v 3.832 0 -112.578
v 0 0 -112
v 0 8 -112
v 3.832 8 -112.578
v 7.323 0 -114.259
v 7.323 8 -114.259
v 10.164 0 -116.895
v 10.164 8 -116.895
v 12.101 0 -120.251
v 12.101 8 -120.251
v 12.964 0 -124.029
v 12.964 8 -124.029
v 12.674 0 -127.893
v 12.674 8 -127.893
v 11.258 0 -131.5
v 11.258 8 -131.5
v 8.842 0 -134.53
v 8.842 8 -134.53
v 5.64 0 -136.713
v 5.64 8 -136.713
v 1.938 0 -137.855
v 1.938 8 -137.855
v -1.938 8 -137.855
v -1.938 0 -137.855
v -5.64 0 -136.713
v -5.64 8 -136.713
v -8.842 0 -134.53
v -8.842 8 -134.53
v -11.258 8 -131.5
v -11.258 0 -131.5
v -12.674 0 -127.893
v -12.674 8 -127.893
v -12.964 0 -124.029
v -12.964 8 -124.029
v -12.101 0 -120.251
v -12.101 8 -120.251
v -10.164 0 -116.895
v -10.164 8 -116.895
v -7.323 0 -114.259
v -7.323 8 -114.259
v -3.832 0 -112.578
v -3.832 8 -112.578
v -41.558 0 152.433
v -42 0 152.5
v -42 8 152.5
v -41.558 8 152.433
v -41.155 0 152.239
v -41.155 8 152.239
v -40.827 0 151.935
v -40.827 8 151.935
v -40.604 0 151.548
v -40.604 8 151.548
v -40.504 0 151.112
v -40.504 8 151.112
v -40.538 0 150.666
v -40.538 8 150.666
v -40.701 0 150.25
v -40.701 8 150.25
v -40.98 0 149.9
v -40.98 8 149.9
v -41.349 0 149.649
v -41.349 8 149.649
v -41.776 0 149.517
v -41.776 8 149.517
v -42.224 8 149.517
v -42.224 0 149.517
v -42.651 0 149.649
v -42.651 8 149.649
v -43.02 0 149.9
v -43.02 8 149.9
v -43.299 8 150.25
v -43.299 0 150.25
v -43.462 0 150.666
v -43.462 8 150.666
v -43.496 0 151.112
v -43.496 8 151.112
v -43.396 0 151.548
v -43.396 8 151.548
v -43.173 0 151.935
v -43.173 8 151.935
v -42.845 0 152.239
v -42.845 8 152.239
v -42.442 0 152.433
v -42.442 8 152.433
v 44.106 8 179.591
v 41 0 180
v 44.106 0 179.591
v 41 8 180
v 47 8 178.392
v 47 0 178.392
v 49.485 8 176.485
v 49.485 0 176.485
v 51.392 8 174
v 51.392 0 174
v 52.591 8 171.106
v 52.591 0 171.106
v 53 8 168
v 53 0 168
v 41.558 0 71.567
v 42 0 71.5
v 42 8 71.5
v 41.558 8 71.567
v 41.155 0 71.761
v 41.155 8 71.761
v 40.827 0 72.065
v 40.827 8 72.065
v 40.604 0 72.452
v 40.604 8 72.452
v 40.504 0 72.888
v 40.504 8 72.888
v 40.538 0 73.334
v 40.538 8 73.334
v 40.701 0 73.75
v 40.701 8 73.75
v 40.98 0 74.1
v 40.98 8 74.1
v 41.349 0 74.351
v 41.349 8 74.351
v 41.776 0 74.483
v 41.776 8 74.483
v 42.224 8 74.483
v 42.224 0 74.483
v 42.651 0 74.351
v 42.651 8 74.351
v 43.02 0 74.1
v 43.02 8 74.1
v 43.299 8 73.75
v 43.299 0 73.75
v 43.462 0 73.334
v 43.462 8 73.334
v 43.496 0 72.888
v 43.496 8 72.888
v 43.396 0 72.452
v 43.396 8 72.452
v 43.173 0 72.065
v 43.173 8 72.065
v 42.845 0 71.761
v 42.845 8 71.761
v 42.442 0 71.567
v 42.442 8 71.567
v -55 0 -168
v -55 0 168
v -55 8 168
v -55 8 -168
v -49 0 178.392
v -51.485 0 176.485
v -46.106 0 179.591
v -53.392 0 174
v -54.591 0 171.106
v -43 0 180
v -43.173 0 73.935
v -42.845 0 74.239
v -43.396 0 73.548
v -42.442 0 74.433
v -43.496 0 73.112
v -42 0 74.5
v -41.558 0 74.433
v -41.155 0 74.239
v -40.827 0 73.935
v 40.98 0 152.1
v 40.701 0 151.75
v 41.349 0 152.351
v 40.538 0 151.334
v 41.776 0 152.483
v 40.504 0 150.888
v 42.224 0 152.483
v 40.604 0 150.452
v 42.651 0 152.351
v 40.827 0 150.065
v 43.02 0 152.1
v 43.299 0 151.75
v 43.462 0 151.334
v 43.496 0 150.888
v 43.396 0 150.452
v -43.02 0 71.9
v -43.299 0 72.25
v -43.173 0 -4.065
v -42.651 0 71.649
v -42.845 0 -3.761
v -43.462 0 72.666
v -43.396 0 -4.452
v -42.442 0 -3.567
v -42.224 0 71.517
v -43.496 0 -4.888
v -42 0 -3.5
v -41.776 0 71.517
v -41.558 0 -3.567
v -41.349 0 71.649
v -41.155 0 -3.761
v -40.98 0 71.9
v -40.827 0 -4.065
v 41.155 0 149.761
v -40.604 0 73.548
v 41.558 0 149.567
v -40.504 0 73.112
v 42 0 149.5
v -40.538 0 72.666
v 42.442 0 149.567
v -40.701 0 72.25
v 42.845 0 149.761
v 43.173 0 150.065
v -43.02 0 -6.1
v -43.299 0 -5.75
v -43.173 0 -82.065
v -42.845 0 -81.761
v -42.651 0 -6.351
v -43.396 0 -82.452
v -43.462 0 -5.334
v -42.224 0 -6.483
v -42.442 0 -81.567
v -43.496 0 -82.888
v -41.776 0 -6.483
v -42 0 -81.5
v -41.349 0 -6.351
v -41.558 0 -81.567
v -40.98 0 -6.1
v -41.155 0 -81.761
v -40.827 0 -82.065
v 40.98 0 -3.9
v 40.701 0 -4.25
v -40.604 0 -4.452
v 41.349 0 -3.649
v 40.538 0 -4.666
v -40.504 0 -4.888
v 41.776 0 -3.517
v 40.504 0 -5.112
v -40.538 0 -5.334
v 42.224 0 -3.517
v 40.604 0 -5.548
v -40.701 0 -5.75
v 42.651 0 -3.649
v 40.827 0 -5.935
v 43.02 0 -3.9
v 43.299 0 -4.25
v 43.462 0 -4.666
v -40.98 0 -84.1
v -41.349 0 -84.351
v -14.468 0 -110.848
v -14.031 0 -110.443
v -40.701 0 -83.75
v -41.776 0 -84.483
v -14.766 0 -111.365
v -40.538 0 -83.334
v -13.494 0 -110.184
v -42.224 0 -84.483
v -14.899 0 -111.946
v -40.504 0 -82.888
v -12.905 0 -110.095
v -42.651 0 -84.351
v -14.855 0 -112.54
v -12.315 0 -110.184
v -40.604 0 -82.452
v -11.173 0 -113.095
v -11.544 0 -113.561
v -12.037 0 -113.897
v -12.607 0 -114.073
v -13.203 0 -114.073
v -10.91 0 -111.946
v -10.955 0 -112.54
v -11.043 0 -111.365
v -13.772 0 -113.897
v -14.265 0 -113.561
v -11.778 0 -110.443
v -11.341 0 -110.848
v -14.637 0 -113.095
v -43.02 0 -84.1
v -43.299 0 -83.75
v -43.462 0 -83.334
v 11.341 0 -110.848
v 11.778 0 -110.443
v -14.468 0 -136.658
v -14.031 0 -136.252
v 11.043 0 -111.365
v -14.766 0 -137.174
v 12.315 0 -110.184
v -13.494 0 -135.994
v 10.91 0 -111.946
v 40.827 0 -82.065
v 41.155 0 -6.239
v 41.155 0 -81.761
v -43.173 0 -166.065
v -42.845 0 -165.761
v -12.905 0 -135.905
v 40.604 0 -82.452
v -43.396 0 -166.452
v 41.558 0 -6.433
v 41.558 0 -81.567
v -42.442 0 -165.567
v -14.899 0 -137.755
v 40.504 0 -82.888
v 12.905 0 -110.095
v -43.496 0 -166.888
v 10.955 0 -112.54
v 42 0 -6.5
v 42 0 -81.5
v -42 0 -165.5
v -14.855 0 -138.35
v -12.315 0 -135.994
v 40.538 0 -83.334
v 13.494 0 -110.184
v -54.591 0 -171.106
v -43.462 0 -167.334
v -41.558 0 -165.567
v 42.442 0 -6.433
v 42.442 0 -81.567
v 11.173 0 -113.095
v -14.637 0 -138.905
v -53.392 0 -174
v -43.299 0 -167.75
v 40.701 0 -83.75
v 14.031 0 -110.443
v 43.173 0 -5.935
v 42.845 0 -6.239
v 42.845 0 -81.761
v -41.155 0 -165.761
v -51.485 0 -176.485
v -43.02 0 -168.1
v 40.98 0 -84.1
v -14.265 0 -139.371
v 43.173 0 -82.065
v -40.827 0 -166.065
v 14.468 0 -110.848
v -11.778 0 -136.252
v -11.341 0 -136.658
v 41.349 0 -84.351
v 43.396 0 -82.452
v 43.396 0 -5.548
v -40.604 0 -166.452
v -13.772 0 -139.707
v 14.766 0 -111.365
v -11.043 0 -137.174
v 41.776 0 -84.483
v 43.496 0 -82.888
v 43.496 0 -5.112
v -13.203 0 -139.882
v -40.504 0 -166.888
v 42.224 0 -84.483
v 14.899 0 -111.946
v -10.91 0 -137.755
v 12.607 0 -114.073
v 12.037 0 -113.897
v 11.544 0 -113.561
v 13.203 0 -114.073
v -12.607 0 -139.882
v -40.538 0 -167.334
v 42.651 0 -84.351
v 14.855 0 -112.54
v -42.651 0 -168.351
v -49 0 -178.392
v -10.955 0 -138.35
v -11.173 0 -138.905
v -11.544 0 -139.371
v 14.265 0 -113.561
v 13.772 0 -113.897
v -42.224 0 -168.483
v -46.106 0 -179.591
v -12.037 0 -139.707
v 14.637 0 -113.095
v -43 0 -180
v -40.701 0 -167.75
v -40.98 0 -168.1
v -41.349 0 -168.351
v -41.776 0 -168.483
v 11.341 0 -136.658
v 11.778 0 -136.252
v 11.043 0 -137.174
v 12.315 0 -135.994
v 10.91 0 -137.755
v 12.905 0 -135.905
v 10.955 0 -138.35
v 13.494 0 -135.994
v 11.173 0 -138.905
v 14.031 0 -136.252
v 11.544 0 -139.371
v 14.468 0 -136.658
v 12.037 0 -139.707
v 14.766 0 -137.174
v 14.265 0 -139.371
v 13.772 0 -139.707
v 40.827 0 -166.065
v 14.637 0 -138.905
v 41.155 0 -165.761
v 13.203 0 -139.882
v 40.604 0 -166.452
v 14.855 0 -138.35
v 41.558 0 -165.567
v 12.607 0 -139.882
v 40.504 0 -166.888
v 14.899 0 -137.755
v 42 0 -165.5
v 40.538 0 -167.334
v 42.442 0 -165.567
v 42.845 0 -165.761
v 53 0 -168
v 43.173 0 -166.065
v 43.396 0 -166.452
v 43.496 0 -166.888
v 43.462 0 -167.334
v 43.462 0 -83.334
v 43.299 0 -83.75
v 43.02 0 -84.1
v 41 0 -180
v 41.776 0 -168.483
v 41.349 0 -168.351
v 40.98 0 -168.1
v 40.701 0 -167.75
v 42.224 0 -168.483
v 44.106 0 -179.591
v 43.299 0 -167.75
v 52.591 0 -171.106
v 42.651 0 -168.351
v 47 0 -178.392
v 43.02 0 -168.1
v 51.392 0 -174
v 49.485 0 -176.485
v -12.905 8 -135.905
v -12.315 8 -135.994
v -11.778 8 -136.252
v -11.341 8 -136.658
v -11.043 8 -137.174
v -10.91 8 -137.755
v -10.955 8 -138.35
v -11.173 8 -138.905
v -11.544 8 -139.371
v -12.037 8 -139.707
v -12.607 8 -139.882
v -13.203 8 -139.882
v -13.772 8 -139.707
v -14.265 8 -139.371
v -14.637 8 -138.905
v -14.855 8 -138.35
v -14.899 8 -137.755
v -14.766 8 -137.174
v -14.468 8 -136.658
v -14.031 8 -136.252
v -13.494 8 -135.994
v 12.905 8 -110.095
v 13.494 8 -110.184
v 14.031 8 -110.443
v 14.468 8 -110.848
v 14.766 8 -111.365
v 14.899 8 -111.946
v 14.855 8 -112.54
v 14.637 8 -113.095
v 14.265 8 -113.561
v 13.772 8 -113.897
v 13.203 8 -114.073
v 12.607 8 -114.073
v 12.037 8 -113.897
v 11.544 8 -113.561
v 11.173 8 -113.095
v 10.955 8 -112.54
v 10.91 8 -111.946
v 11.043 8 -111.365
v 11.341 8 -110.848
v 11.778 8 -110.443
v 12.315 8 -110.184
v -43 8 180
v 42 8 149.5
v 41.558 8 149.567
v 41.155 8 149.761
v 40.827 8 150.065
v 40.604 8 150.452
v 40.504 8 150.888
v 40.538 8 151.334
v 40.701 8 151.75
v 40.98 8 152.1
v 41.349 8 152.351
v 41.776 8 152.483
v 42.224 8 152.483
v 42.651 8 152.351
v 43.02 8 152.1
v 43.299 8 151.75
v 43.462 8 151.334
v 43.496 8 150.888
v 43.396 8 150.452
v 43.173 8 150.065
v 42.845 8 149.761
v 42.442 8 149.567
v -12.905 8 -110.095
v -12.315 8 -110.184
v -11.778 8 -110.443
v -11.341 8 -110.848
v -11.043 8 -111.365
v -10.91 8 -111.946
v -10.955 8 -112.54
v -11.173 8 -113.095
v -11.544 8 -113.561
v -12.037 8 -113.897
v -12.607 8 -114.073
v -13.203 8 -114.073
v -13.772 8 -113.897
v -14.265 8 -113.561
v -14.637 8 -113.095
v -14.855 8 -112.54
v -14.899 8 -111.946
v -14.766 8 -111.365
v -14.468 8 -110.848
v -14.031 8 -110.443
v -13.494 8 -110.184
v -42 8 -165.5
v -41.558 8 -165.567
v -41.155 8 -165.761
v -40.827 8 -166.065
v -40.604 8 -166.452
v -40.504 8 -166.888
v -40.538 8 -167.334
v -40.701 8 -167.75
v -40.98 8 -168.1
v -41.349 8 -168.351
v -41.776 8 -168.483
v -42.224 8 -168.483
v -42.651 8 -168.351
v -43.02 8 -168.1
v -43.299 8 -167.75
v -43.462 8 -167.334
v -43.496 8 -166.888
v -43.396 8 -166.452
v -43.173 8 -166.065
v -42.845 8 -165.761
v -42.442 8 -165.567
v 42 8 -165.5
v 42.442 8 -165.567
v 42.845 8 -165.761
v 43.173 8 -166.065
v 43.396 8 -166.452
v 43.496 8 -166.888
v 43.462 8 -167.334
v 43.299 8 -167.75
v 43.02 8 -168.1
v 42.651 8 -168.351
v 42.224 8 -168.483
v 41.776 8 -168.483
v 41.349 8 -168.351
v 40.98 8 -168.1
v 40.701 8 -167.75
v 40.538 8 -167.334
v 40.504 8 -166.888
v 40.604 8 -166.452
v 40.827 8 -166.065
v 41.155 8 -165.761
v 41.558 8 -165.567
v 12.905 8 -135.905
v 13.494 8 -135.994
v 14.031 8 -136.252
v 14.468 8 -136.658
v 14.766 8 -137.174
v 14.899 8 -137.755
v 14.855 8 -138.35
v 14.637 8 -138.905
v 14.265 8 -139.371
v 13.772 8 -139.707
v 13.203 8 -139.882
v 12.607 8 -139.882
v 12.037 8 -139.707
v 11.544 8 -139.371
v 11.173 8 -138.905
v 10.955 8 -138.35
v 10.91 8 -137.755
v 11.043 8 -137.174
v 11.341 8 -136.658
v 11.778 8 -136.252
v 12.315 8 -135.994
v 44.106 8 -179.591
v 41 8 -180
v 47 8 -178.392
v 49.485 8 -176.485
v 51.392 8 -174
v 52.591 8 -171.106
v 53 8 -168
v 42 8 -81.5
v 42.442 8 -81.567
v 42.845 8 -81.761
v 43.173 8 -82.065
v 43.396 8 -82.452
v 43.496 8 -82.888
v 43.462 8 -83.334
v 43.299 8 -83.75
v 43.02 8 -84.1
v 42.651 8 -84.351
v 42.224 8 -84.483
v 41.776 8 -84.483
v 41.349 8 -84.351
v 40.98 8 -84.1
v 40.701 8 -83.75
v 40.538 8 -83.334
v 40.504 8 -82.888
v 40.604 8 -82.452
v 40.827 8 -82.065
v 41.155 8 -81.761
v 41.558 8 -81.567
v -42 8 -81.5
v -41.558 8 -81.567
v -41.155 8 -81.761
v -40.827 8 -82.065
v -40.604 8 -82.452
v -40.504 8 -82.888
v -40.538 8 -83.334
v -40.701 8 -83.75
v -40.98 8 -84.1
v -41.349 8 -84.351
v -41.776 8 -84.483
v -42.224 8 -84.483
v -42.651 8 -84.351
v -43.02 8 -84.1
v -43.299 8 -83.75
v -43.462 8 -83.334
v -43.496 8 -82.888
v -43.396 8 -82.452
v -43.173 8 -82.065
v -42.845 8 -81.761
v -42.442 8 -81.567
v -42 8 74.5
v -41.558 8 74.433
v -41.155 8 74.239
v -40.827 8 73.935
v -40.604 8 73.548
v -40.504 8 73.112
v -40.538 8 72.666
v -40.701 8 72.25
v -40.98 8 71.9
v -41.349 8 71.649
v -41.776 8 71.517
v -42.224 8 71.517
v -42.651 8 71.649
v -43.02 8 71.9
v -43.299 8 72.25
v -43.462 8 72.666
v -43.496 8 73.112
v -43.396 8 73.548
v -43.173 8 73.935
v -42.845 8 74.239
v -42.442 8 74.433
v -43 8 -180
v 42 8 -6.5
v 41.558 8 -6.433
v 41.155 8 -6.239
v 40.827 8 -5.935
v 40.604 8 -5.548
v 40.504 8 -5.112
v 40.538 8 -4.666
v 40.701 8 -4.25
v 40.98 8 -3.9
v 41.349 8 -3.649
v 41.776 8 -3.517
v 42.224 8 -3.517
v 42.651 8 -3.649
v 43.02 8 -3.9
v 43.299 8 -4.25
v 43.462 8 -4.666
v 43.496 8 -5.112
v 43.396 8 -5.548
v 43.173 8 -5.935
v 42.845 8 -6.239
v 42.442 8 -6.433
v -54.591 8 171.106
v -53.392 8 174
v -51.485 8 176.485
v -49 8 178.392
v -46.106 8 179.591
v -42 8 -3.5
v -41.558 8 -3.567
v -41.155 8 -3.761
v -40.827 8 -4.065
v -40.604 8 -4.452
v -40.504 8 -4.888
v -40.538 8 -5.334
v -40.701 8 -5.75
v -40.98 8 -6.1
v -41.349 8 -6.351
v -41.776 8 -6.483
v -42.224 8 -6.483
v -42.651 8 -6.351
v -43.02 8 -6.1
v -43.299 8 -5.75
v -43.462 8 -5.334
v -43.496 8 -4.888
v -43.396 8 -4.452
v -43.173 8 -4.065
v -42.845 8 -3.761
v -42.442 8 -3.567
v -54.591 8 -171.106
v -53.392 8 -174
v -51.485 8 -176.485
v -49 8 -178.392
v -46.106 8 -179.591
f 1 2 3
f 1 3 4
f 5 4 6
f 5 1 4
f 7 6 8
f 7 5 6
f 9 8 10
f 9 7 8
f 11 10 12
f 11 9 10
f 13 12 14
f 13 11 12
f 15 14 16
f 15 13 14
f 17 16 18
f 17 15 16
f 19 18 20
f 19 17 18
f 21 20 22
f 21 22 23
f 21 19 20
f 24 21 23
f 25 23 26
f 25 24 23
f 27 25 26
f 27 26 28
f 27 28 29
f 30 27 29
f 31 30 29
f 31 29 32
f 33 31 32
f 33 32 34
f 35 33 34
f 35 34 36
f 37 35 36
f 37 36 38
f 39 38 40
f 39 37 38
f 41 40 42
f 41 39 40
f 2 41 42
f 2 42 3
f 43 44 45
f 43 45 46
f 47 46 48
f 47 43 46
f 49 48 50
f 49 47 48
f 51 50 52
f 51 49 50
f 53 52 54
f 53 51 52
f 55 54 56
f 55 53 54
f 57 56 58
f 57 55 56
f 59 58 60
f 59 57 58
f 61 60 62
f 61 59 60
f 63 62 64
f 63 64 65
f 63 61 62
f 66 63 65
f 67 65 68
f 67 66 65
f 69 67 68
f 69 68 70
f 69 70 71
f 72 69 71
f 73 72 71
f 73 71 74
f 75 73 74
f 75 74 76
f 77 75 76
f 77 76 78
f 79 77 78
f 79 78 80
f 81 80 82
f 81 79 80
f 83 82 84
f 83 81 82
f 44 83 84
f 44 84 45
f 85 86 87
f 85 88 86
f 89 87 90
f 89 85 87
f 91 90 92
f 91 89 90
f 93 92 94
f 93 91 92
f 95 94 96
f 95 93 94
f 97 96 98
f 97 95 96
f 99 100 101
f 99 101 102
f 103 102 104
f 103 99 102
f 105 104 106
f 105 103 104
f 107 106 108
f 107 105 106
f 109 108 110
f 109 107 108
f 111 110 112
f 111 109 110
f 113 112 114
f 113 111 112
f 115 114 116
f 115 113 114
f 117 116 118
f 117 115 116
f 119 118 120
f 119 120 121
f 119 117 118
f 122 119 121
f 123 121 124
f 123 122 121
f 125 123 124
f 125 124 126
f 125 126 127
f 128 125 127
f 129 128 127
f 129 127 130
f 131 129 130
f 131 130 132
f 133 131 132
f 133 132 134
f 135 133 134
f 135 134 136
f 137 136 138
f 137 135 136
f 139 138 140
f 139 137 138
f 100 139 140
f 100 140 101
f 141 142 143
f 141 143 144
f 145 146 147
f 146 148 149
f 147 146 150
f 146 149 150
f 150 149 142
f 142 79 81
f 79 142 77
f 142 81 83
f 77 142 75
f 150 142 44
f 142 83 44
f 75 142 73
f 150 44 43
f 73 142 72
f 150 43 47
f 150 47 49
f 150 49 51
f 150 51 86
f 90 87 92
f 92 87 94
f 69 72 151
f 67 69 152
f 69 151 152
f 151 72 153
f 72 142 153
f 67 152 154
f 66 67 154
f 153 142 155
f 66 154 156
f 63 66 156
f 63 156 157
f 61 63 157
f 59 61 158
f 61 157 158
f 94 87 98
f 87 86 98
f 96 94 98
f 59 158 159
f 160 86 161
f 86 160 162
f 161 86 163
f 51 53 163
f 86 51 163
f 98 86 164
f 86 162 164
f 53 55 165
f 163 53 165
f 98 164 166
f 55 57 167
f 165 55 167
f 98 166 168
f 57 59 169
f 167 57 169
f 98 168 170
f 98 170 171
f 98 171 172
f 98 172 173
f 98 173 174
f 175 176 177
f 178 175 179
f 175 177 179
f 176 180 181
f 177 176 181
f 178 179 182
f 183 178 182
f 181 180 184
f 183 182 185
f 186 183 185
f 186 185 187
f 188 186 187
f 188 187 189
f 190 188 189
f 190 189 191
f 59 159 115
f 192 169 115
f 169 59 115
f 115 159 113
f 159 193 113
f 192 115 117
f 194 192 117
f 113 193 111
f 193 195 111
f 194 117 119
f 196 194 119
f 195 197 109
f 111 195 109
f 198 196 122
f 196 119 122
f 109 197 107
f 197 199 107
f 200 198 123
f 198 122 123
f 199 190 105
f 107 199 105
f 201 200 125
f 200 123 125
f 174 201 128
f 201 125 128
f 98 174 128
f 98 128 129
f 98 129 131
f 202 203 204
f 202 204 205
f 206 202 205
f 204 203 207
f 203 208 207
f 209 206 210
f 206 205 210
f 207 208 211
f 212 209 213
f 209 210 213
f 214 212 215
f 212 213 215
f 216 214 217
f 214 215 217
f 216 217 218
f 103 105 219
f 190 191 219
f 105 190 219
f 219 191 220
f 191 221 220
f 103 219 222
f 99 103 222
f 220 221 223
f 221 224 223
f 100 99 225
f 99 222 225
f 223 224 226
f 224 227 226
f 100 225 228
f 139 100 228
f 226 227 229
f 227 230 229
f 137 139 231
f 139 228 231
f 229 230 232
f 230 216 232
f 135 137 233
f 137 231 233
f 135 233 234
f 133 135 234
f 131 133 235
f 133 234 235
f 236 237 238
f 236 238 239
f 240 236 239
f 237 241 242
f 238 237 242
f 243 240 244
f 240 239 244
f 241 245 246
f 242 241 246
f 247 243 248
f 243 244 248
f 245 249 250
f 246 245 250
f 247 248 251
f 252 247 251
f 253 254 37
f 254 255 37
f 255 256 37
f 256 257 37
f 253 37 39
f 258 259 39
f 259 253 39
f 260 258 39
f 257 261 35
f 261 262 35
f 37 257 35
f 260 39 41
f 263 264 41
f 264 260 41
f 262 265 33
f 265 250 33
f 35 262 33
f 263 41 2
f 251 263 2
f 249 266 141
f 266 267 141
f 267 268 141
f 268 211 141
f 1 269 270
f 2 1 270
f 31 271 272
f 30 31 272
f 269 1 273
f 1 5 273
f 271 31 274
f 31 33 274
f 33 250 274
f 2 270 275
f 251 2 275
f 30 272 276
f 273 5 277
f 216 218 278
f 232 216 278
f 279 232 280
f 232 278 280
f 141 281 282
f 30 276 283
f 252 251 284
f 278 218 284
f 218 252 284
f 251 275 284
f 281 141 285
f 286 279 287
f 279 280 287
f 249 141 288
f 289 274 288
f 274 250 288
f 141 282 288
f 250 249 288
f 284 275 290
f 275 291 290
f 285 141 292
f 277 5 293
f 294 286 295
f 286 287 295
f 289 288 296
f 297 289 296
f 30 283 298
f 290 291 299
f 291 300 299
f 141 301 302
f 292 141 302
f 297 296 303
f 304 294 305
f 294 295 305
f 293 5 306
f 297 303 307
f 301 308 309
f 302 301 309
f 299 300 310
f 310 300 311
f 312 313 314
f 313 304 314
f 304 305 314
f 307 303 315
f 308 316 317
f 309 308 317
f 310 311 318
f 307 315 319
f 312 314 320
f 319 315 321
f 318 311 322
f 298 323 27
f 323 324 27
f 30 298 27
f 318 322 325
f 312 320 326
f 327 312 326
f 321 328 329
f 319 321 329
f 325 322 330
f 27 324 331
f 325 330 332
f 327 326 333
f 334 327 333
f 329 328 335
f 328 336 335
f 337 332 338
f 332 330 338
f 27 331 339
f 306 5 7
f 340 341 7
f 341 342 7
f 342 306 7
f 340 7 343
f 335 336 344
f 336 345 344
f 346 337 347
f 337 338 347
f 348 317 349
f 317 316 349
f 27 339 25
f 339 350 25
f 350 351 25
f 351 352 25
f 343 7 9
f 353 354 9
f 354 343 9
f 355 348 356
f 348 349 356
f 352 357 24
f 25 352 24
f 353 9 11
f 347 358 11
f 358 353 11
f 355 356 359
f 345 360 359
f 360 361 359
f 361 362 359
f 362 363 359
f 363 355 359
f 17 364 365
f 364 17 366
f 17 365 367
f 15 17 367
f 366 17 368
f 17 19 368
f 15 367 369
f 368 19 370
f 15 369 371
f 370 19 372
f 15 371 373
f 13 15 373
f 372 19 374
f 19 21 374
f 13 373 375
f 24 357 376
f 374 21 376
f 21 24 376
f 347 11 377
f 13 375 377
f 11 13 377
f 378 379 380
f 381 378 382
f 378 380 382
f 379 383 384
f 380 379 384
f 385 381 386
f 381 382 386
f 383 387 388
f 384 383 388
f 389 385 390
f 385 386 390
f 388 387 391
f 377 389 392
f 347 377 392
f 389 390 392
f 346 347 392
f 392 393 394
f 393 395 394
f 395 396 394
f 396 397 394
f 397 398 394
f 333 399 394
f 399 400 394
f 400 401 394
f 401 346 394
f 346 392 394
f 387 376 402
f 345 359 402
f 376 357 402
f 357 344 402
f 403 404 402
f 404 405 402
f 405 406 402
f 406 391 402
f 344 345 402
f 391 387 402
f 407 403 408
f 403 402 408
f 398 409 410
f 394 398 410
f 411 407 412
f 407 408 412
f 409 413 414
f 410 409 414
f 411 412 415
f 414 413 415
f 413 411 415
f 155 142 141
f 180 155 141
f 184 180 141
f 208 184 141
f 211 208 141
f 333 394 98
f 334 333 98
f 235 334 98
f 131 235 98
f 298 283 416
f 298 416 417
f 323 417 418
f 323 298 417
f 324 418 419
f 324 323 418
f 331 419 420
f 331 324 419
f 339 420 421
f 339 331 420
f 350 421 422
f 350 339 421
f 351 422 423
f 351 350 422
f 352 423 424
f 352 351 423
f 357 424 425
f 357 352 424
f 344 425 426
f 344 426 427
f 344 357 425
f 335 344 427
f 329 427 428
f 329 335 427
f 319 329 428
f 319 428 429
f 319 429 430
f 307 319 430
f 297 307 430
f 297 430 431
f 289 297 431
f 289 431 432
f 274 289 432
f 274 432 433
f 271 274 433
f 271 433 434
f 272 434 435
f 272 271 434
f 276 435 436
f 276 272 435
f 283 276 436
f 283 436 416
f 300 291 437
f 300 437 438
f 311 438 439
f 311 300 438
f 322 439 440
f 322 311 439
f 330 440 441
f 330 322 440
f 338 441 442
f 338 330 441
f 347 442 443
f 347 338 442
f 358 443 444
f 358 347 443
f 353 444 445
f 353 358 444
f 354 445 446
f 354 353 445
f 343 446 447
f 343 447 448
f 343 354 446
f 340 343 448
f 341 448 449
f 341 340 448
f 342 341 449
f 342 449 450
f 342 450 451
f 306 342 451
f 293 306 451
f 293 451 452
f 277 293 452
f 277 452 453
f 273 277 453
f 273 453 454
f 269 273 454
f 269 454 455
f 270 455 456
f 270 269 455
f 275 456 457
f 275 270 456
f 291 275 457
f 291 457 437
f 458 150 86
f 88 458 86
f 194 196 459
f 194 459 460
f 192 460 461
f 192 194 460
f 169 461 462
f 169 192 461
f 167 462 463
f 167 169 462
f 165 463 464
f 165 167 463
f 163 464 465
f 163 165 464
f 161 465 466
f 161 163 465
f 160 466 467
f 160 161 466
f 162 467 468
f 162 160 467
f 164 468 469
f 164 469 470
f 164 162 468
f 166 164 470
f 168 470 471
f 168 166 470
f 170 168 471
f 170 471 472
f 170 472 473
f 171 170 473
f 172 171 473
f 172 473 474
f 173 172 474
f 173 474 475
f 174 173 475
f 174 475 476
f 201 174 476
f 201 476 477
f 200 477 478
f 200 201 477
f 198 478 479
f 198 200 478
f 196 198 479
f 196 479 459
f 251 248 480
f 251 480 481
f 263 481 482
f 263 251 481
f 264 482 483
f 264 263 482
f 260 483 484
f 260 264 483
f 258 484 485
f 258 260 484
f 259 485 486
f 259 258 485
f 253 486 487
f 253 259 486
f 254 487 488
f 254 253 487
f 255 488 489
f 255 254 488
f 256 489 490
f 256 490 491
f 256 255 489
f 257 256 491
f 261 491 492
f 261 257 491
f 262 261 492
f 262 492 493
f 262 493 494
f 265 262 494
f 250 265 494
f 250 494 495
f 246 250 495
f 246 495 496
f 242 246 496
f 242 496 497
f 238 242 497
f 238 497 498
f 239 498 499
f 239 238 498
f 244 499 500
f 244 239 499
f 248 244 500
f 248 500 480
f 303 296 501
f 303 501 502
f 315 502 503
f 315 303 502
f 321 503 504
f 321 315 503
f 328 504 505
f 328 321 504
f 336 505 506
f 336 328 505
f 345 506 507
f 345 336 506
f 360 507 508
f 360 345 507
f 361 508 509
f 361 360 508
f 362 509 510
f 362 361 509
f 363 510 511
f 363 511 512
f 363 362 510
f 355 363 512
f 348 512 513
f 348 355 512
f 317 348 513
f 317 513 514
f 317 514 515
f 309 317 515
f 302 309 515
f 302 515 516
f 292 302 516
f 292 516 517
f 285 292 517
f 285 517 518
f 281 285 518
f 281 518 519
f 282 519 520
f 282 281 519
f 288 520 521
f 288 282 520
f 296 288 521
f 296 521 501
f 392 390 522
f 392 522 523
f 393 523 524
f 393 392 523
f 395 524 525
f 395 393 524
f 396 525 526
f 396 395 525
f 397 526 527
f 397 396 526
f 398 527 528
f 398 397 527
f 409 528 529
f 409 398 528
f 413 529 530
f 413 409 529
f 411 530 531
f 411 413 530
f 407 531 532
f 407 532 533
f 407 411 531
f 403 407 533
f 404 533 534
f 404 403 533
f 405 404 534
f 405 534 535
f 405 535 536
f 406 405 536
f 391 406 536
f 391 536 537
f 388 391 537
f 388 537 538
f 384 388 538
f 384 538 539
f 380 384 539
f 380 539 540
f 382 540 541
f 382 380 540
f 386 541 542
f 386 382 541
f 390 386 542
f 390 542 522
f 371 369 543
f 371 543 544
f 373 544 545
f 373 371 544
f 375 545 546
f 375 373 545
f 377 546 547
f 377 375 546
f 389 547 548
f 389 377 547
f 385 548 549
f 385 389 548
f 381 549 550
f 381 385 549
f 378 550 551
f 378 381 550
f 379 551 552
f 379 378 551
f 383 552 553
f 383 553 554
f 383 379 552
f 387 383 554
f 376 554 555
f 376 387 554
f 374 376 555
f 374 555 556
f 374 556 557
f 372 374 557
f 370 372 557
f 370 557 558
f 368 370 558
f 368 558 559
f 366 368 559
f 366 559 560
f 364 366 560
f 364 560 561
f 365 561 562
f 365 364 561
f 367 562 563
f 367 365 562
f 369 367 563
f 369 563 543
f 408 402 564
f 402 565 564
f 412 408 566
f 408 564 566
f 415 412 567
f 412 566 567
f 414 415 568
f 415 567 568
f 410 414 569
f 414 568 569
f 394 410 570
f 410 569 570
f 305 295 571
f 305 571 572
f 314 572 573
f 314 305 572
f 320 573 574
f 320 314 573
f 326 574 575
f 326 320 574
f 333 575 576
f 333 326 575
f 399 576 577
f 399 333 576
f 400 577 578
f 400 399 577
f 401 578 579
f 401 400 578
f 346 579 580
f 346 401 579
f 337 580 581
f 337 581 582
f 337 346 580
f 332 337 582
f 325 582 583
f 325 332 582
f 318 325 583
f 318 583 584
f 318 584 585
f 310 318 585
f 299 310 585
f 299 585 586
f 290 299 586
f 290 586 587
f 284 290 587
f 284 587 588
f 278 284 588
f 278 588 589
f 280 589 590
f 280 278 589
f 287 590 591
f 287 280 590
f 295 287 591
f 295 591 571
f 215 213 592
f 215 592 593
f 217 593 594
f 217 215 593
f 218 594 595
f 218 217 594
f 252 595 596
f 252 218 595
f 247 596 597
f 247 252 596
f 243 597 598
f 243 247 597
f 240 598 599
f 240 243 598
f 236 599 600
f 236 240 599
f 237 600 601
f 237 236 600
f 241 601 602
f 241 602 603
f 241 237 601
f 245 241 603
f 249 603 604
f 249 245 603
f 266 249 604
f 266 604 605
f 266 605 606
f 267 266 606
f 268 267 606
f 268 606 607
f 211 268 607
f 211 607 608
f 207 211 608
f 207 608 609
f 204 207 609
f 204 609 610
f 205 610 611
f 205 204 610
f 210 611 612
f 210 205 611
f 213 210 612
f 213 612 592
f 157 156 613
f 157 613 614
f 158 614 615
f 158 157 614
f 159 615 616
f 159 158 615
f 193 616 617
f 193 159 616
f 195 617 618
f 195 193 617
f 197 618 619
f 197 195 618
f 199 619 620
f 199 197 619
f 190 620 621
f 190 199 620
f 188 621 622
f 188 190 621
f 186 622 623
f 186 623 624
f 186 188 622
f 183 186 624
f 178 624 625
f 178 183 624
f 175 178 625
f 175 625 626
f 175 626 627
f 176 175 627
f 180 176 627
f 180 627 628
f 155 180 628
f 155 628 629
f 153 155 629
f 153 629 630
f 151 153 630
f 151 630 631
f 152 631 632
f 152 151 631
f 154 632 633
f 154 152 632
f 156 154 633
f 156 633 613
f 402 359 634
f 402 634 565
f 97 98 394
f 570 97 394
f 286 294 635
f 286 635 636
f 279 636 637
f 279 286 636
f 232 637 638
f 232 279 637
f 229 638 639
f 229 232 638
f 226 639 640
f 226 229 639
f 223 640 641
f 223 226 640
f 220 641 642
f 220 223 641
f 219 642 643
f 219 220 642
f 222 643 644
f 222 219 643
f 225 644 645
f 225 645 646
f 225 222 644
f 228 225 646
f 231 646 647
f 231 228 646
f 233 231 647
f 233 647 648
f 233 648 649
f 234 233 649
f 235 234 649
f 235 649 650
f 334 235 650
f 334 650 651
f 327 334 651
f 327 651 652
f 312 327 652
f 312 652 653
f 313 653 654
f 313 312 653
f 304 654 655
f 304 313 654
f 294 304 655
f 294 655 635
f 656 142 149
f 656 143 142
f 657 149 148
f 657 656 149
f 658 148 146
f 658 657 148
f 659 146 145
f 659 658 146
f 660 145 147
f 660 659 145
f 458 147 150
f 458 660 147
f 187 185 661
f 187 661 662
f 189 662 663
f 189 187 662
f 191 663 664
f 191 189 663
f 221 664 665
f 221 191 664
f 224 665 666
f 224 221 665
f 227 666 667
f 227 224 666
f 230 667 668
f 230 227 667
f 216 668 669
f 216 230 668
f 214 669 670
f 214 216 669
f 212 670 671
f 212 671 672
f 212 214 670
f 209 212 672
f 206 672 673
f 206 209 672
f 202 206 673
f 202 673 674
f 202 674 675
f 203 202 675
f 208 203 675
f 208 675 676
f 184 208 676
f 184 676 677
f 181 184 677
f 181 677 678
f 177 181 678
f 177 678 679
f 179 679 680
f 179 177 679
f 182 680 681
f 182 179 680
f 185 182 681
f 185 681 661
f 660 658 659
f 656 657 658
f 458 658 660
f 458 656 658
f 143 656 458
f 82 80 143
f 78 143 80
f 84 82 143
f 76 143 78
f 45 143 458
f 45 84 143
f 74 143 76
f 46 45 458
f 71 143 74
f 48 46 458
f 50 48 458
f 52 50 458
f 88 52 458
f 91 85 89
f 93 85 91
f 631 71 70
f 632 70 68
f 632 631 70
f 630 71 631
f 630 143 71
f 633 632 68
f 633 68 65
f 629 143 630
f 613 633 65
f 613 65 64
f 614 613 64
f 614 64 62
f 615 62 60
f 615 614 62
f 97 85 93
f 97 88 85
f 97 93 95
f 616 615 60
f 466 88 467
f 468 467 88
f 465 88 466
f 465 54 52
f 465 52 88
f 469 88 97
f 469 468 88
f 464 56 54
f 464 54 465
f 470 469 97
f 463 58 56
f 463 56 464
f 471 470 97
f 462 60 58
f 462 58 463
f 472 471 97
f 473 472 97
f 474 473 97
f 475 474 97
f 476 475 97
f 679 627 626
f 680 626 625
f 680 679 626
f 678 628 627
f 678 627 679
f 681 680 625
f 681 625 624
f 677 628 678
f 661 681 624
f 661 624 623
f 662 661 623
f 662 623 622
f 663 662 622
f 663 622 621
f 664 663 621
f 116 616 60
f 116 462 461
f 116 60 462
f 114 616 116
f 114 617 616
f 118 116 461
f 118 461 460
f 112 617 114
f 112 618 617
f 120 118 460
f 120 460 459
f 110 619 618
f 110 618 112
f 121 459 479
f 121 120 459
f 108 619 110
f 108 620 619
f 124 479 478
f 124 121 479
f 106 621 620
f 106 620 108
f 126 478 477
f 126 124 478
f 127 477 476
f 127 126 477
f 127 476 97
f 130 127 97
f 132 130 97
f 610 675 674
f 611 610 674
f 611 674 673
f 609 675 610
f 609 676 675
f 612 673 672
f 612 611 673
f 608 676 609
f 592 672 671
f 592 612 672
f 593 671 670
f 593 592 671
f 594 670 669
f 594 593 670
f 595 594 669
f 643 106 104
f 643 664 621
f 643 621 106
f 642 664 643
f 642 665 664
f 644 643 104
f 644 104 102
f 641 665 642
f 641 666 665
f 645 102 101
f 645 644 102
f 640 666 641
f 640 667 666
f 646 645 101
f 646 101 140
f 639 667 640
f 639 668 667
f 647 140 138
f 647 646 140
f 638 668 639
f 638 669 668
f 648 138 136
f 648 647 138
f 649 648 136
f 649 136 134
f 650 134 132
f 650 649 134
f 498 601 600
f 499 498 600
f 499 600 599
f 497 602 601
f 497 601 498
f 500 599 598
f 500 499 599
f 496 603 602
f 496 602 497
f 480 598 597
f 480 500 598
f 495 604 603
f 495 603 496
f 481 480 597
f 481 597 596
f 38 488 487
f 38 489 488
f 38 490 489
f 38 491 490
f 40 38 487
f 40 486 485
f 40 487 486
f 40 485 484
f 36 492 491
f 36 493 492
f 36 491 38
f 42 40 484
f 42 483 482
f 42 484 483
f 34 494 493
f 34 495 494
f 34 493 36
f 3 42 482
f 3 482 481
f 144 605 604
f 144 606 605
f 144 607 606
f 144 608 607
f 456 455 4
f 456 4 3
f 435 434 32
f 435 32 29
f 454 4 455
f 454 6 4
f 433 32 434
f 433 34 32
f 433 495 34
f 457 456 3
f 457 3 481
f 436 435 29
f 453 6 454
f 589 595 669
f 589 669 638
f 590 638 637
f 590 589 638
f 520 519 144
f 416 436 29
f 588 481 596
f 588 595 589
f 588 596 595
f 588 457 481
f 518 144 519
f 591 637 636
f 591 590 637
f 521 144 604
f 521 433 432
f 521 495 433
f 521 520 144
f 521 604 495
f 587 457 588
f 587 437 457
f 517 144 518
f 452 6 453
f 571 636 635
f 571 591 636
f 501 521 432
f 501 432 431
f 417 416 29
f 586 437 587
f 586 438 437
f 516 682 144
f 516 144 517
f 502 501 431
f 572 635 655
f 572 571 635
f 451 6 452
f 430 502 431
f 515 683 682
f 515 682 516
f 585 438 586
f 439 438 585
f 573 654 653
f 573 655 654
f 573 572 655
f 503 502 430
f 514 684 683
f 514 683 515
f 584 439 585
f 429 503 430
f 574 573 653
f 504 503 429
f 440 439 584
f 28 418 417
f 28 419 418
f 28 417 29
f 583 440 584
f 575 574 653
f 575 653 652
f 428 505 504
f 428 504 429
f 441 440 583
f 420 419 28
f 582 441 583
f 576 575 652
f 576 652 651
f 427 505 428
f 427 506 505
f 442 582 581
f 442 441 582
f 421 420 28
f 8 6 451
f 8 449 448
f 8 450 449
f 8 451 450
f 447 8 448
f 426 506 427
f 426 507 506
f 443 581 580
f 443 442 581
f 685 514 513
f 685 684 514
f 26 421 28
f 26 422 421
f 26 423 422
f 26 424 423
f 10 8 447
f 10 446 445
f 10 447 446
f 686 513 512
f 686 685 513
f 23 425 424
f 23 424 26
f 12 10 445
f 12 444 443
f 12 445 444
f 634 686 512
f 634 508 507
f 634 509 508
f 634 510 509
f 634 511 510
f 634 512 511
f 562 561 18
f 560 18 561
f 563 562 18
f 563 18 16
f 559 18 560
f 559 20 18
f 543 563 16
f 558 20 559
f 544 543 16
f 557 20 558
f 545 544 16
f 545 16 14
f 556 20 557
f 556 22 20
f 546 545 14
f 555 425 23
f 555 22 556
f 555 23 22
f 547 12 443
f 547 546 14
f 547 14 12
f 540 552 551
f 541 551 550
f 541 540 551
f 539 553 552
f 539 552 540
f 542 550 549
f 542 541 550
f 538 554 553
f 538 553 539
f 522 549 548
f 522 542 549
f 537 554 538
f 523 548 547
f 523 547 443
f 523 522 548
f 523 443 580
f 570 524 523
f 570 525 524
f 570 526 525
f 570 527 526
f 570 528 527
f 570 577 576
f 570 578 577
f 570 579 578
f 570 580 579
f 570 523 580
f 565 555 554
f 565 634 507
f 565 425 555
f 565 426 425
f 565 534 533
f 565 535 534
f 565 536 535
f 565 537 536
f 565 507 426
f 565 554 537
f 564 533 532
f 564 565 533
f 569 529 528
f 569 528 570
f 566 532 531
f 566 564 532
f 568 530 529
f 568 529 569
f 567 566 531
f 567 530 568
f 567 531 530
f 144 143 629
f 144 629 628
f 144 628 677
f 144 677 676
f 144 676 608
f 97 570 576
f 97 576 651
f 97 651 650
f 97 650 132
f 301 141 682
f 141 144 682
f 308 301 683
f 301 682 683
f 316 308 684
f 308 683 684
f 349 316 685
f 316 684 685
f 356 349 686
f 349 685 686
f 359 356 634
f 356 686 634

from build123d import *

# Parameters (mm, degrees)
SKETCH1_W           = 108
SKETCH1_H           = 360
SKETCH1_R           = 13
SKETCH1_R_2         = 1.5
SKETCH1_R_3         = 2
BOSS_EXTRUDE1_DEPTH = 8
FILLET1_R           = 12


with BuildPart() as part:
    # Sketch1 → Boss-Extrude1 (new body)
    with BuildSketch(Plane(origin=(0, 0, 0), x_dir=(1, 0, 0), z_dir=(0, 1, 0))):
        with Locations((-1, 0)):
            Rectangle(SKETCH1_W, SKETCH1_H)
        with Locations(Location((0, 125, 0), (0, 0, 270))):
            Circle(SKETCH1_R, mode=Mode.SUBTRACT)
        with Locations(Location((-42, 83, 0), (0, 0, 270))):
            Circle(SKETCH1_R_2, mode=Mode.SUBTRACT)
        with Locations(Location((-42, 167, 0), (0, 0, 270))):
            Circle(SKETCH1_R_2, mode=Mode.SUBTRACT)
        with Locations(Location((42, 167, 0), (0, 0, 270))):
            Circle(SKETCH1_R_2, mode=Mode.SUBTRACT)
        with Locations(Location((42, 83, 0), (0, 0, 270))):
            Circle(SKETCH1_R_2, mode=Mode.SUBTRACT)
        with Locations(Location((-12.904698757, 112.095301243, 0), (0, 0, 270))):
            Circle(SKETCH1_R_3, mode=Mode.SUBTRACT)
        with Locations(Location((-12.904698757, 137.904698757, 0), (0, 0, 270))):
            Circle(SKETCH1_R_3, mode=Mode.SUBTRACT)
        with Locations(Location((12.904698757, 137.904698757, 0), (0, 0, 270))):
            Circle(SKETCH1_R_3, mode=Mode.SUBTRACT)
        with Locations(Location((12.904698757, 112.095301243, 0), (0, 0, 270))):
            Circle(SKETCH1_R_3, mode=Mode.SUBTRACT)
        with Locations(Location((-42, 5, 0), (0, 0, 270))):
            Circle(SKETCH1_R_2, mode=Mode.SUBTRACT)
        with Locations(Location((-42, -73, 0), (0, 0, 270))):
            Circle(SKETCH1_R_2, mode=Mode.SUBTRACT)
        with Locations(Location((-42, -151, 0), (0, 0, 270))):
            Circle(SKETCH1_R_2, mode=Mode.SUBTRACT)
        with Locations(Location((42, -151, 0), (0, 0, 90))):
            Circle(SKETCH1_R_2, mode=Mode.SUBTRACT)
        with Locations(Location((42, -73, 0), (0, 0, 90))):
            Circle(SKETCH1_R_2, mode=Mode.SUBTRACT)
        with Locations(Location((42, 5, 0), (0, 0, 90))):
            Circle(SKETCH1_R_2, mode=Mode.SUBTRACT)
    extrude(amount=BOSS_EXTRUDE1_DEPTH)

    # Fillet1
    fillet1_edges = [part.edges().sort_by_distance(p)[0] for p in [
        (53, 4, 180),
        (-55, 4, 180),
        (-55, 4, -180),
        (53, 4, -180),
    ]]
    fillet(fillet1_edges, radius=FILLET1_R)


solid = part.part
